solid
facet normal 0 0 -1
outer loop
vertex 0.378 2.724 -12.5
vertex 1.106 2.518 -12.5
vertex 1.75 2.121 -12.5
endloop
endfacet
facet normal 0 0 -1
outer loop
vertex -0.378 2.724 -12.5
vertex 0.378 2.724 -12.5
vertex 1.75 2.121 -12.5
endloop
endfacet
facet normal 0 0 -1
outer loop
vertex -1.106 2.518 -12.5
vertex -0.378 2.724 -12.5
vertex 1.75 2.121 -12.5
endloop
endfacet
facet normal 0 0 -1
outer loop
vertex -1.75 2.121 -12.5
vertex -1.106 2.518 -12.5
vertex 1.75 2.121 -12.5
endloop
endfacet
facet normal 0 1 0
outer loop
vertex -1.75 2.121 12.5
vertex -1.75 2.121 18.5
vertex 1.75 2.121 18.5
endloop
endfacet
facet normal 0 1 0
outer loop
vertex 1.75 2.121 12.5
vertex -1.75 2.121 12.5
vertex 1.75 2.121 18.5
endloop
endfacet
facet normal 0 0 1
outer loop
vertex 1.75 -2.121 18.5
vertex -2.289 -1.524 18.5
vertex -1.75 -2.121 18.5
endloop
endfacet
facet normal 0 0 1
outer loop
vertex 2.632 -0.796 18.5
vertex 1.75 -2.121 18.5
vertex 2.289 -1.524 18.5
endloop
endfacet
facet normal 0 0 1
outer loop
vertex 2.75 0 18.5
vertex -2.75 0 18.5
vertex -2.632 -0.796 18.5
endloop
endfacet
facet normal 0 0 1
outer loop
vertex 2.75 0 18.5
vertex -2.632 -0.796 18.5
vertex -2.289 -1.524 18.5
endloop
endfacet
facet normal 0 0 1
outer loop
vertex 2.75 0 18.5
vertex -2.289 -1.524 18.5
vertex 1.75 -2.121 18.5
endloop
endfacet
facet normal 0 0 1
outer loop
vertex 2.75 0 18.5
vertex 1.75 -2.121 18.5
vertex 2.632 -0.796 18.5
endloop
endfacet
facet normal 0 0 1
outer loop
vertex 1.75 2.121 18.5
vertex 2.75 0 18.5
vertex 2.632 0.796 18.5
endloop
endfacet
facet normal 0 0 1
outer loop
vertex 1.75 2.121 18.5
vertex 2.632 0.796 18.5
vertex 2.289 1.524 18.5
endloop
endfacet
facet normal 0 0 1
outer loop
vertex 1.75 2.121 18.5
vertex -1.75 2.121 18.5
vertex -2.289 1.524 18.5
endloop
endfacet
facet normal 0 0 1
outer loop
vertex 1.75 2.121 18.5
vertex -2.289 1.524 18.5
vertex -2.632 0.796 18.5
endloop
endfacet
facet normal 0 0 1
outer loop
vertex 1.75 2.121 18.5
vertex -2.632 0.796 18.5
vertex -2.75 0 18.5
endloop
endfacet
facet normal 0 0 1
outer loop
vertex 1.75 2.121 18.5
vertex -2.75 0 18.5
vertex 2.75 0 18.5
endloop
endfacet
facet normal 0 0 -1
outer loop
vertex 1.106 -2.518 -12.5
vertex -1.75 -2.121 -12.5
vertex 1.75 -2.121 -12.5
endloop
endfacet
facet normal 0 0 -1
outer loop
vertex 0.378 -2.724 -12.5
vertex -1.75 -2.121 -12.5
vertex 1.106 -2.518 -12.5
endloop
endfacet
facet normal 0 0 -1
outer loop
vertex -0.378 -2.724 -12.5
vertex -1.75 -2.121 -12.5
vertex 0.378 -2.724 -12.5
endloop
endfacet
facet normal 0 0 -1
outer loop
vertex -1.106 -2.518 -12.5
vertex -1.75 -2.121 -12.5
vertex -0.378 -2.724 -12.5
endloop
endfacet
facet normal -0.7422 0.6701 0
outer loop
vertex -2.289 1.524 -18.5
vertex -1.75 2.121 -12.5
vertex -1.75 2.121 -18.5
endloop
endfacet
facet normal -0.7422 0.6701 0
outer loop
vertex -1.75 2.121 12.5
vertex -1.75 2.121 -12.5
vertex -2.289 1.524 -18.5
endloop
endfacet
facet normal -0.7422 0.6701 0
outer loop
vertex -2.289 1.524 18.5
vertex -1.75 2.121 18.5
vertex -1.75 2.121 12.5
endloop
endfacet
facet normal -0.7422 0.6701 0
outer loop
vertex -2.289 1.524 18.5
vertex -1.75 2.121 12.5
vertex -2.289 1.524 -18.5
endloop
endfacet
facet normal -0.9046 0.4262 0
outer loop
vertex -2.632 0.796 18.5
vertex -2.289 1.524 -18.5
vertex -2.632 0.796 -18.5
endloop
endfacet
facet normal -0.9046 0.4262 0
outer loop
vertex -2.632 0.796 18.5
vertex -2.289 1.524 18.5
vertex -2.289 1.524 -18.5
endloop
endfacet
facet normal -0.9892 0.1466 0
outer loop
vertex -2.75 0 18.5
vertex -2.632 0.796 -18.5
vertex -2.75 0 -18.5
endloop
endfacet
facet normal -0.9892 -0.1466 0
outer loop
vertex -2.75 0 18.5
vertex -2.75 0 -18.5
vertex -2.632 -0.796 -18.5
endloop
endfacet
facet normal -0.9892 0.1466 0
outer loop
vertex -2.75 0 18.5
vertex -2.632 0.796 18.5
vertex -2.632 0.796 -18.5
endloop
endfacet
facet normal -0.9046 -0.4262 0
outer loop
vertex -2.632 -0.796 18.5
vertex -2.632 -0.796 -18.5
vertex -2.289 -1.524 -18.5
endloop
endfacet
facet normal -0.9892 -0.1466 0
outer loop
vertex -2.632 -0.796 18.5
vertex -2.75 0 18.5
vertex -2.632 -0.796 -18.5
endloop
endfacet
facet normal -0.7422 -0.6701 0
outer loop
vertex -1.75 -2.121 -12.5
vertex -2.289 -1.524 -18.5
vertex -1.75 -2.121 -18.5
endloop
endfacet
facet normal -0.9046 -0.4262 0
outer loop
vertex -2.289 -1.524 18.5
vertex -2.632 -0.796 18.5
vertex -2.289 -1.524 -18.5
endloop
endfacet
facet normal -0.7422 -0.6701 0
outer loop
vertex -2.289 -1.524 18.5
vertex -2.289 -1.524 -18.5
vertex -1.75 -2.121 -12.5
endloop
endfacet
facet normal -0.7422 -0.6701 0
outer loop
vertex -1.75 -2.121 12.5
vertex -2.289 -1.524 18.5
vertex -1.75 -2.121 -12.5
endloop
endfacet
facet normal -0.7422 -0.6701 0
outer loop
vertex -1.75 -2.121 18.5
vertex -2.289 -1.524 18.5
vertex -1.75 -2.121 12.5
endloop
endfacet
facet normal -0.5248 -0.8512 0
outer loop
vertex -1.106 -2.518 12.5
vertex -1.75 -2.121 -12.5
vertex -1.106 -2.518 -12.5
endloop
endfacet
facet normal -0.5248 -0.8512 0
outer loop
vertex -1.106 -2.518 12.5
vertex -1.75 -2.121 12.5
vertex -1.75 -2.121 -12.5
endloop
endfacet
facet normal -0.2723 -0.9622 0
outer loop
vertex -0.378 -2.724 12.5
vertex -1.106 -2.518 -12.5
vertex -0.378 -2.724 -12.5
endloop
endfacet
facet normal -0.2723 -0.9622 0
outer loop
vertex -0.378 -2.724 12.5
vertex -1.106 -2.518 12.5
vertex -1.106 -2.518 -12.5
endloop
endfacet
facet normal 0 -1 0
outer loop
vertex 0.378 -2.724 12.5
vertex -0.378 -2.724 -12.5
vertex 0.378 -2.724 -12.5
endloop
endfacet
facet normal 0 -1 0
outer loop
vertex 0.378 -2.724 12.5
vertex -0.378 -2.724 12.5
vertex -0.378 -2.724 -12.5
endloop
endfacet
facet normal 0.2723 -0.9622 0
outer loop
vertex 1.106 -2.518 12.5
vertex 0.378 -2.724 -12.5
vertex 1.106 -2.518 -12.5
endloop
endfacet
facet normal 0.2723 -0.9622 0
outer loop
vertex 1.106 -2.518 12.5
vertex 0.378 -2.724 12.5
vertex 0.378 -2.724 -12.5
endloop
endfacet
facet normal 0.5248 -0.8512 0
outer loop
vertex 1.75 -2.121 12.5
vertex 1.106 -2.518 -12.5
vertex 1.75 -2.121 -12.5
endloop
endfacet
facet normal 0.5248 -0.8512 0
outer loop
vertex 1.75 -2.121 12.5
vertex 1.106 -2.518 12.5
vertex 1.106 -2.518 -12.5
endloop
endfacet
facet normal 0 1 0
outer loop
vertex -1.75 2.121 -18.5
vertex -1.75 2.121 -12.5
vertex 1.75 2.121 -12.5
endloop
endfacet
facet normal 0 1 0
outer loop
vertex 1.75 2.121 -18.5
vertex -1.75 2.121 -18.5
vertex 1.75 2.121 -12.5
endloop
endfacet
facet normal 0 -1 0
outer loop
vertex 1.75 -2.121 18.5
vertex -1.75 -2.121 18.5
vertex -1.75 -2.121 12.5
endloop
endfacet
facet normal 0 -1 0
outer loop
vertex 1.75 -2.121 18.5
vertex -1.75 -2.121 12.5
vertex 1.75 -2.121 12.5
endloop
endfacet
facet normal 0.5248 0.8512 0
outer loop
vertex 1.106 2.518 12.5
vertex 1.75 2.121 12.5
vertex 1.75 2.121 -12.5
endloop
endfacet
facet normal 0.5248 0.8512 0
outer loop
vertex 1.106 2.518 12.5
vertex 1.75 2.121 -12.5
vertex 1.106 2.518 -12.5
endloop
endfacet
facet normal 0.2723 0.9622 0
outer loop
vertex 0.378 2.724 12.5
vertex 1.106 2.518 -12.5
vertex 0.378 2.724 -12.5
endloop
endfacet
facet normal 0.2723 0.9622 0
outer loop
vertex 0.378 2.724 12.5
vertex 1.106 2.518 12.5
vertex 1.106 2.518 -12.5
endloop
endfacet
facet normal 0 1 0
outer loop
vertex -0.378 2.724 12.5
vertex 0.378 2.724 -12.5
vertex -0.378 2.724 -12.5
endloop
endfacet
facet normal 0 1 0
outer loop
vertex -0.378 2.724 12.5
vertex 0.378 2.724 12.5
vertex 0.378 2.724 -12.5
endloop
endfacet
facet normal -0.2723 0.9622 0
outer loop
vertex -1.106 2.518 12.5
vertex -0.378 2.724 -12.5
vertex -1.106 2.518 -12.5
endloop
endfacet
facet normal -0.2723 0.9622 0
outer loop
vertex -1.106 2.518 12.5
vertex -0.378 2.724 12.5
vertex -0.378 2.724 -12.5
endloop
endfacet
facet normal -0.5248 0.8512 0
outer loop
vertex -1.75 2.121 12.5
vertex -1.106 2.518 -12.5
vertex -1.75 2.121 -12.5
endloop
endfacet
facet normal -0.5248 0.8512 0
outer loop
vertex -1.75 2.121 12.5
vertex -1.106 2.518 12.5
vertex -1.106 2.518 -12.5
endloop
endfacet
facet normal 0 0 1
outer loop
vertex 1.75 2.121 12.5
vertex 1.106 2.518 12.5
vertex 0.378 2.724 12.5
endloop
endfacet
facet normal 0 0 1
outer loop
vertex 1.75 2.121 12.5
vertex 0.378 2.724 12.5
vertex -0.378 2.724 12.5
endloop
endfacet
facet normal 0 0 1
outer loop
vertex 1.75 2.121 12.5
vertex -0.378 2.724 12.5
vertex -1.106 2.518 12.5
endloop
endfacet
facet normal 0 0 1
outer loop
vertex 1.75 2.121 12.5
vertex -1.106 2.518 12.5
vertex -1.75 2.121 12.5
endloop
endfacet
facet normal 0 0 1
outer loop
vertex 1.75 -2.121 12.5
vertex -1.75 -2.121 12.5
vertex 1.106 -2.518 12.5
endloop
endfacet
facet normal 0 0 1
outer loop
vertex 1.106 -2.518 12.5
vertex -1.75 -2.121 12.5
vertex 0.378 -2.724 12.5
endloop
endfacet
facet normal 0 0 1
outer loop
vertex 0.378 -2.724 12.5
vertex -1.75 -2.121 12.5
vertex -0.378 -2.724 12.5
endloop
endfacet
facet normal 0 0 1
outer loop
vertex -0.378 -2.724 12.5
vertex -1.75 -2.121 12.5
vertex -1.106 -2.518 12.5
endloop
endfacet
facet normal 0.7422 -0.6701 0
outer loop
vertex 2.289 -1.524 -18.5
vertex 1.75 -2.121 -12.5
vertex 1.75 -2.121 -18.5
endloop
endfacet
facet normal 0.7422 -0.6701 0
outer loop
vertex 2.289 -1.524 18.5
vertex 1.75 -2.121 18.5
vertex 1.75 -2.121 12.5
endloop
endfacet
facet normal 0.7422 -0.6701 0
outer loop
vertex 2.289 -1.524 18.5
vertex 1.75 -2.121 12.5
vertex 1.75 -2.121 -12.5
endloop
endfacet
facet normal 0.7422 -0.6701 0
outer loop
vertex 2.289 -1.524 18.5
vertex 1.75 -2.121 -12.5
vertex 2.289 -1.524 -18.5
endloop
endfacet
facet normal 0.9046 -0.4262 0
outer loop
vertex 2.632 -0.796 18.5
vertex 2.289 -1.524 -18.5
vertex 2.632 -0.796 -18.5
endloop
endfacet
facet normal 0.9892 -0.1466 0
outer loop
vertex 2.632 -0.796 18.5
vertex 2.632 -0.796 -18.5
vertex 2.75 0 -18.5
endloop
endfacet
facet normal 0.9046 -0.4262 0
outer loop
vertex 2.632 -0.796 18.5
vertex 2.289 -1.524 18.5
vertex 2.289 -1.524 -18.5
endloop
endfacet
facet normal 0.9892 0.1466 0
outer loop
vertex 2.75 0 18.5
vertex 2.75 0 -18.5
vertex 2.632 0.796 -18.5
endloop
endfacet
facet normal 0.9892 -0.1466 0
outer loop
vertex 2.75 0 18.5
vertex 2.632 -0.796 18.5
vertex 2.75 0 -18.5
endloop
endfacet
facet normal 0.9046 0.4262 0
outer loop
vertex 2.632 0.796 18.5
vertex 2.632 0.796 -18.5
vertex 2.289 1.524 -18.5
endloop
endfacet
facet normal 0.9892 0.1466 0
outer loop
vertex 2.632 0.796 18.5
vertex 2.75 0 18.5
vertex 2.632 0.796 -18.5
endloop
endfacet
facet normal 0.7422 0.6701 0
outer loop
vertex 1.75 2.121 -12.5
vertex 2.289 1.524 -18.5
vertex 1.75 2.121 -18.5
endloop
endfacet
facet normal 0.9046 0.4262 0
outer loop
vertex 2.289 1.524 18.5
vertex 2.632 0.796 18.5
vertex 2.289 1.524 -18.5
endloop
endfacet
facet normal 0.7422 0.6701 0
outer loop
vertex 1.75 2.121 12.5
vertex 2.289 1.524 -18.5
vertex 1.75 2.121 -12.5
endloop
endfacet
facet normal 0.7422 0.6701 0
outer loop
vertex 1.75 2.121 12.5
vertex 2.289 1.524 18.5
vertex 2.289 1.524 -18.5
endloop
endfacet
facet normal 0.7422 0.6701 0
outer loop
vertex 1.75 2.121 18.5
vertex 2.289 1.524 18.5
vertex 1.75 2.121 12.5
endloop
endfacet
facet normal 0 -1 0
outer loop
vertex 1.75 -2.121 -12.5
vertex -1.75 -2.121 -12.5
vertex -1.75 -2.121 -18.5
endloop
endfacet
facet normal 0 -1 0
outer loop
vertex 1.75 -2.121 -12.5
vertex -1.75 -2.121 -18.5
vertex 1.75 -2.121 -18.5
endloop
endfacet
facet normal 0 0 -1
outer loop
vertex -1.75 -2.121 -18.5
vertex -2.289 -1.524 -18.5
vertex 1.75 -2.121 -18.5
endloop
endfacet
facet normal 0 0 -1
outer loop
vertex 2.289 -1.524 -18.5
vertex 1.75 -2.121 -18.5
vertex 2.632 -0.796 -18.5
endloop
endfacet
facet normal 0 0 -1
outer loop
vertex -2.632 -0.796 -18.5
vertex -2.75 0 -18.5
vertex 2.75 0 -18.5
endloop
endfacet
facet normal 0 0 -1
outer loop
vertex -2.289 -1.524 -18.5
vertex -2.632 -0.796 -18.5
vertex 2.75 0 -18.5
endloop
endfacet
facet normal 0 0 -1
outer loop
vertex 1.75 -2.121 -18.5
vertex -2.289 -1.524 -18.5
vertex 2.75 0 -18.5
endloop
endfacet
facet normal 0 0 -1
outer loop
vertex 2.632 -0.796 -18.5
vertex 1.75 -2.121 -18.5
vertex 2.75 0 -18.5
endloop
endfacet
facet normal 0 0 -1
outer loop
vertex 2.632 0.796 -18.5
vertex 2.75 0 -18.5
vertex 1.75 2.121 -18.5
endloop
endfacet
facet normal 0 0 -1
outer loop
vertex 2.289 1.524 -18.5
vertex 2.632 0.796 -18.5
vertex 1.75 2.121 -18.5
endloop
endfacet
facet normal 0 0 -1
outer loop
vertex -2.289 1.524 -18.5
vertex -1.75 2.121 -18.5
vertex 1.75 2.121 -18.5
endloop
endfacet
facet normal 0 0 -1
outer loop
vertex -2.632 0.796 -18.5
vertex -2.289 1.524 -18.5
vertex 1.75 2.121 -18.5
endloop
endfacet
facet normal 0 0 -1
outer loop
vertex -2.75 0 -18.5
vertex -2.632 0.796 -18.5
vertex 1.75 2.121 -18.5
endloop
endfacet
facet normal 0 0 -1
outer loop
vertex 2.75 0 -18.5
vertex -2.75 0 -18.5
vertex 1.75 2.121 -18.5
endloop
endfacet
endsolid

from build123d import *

# Parameters (mm, degrees)
F1_DEPTH = 12.5
F0_W     = 3.5
F0_H     = 4.2426406871
F2_DEPTH = 18.5


with BuildPart() as f1:
    # F0 (on Top) → F1 (new body, symmetric)
    with BuildSketch(Plane.XY):
        with BuildLine():
            Line((-1.75, 2.1213203436), (1.75, 2.1213203436))
            ThreePointArc((1.75, 2.1213203436), (0, 2.75), (-1.75, 2.1213203436))
        make_face()
    extrude(amount=F1_DEPTH, both=True)



with BuildPart() as f1b:
    # F0 (on Top) → F1, piece 2 (new body, symmetric)
    with BuildSketch(Plane.XY):
        with BuildLine():
            ThreePointArc((-1.75, -2.1213203436), (0, -2.75), (1.75, -2.1213203436))
            Line((1.75, -2.1213203436), (-1.75, -2.1213203436))
        make_face()
    extrude(amount=F1_DEPTH, both=True)


with BuildPart() as f1_1:
    add(f1.part)

    add(f1b.part)  # F2 merges F1b
    # F0 (on Top) → F2 (join, symmetric)
    with BuildSketch(Plane.XY):
        Rectangle(F0_W, F0_H)
        with BuildLine():
            ThreePointArc((1.75, -2.1213203436), (2.4874685928, -1.17260394), (2.75, 0))
            ThreePointArc((2.75, 0), (2.4874685928, 1.17260394), (1.75, 2.1213203436))
            Line((1.75, 2.1213203436), (1.75, -2.1213203436))
        make_face()
        with BuildLine():
            Line((-1.75, -2.1213203436), (-1.75, 2.1213203436))
            ThreePointArc((-1.75, 2.1213203436), (-2.75, 0), (-1.75, -2.1213203436))
        make_face()
    extrude(amount=F2_DEPTH, both=True)


solid = f1_1.part
